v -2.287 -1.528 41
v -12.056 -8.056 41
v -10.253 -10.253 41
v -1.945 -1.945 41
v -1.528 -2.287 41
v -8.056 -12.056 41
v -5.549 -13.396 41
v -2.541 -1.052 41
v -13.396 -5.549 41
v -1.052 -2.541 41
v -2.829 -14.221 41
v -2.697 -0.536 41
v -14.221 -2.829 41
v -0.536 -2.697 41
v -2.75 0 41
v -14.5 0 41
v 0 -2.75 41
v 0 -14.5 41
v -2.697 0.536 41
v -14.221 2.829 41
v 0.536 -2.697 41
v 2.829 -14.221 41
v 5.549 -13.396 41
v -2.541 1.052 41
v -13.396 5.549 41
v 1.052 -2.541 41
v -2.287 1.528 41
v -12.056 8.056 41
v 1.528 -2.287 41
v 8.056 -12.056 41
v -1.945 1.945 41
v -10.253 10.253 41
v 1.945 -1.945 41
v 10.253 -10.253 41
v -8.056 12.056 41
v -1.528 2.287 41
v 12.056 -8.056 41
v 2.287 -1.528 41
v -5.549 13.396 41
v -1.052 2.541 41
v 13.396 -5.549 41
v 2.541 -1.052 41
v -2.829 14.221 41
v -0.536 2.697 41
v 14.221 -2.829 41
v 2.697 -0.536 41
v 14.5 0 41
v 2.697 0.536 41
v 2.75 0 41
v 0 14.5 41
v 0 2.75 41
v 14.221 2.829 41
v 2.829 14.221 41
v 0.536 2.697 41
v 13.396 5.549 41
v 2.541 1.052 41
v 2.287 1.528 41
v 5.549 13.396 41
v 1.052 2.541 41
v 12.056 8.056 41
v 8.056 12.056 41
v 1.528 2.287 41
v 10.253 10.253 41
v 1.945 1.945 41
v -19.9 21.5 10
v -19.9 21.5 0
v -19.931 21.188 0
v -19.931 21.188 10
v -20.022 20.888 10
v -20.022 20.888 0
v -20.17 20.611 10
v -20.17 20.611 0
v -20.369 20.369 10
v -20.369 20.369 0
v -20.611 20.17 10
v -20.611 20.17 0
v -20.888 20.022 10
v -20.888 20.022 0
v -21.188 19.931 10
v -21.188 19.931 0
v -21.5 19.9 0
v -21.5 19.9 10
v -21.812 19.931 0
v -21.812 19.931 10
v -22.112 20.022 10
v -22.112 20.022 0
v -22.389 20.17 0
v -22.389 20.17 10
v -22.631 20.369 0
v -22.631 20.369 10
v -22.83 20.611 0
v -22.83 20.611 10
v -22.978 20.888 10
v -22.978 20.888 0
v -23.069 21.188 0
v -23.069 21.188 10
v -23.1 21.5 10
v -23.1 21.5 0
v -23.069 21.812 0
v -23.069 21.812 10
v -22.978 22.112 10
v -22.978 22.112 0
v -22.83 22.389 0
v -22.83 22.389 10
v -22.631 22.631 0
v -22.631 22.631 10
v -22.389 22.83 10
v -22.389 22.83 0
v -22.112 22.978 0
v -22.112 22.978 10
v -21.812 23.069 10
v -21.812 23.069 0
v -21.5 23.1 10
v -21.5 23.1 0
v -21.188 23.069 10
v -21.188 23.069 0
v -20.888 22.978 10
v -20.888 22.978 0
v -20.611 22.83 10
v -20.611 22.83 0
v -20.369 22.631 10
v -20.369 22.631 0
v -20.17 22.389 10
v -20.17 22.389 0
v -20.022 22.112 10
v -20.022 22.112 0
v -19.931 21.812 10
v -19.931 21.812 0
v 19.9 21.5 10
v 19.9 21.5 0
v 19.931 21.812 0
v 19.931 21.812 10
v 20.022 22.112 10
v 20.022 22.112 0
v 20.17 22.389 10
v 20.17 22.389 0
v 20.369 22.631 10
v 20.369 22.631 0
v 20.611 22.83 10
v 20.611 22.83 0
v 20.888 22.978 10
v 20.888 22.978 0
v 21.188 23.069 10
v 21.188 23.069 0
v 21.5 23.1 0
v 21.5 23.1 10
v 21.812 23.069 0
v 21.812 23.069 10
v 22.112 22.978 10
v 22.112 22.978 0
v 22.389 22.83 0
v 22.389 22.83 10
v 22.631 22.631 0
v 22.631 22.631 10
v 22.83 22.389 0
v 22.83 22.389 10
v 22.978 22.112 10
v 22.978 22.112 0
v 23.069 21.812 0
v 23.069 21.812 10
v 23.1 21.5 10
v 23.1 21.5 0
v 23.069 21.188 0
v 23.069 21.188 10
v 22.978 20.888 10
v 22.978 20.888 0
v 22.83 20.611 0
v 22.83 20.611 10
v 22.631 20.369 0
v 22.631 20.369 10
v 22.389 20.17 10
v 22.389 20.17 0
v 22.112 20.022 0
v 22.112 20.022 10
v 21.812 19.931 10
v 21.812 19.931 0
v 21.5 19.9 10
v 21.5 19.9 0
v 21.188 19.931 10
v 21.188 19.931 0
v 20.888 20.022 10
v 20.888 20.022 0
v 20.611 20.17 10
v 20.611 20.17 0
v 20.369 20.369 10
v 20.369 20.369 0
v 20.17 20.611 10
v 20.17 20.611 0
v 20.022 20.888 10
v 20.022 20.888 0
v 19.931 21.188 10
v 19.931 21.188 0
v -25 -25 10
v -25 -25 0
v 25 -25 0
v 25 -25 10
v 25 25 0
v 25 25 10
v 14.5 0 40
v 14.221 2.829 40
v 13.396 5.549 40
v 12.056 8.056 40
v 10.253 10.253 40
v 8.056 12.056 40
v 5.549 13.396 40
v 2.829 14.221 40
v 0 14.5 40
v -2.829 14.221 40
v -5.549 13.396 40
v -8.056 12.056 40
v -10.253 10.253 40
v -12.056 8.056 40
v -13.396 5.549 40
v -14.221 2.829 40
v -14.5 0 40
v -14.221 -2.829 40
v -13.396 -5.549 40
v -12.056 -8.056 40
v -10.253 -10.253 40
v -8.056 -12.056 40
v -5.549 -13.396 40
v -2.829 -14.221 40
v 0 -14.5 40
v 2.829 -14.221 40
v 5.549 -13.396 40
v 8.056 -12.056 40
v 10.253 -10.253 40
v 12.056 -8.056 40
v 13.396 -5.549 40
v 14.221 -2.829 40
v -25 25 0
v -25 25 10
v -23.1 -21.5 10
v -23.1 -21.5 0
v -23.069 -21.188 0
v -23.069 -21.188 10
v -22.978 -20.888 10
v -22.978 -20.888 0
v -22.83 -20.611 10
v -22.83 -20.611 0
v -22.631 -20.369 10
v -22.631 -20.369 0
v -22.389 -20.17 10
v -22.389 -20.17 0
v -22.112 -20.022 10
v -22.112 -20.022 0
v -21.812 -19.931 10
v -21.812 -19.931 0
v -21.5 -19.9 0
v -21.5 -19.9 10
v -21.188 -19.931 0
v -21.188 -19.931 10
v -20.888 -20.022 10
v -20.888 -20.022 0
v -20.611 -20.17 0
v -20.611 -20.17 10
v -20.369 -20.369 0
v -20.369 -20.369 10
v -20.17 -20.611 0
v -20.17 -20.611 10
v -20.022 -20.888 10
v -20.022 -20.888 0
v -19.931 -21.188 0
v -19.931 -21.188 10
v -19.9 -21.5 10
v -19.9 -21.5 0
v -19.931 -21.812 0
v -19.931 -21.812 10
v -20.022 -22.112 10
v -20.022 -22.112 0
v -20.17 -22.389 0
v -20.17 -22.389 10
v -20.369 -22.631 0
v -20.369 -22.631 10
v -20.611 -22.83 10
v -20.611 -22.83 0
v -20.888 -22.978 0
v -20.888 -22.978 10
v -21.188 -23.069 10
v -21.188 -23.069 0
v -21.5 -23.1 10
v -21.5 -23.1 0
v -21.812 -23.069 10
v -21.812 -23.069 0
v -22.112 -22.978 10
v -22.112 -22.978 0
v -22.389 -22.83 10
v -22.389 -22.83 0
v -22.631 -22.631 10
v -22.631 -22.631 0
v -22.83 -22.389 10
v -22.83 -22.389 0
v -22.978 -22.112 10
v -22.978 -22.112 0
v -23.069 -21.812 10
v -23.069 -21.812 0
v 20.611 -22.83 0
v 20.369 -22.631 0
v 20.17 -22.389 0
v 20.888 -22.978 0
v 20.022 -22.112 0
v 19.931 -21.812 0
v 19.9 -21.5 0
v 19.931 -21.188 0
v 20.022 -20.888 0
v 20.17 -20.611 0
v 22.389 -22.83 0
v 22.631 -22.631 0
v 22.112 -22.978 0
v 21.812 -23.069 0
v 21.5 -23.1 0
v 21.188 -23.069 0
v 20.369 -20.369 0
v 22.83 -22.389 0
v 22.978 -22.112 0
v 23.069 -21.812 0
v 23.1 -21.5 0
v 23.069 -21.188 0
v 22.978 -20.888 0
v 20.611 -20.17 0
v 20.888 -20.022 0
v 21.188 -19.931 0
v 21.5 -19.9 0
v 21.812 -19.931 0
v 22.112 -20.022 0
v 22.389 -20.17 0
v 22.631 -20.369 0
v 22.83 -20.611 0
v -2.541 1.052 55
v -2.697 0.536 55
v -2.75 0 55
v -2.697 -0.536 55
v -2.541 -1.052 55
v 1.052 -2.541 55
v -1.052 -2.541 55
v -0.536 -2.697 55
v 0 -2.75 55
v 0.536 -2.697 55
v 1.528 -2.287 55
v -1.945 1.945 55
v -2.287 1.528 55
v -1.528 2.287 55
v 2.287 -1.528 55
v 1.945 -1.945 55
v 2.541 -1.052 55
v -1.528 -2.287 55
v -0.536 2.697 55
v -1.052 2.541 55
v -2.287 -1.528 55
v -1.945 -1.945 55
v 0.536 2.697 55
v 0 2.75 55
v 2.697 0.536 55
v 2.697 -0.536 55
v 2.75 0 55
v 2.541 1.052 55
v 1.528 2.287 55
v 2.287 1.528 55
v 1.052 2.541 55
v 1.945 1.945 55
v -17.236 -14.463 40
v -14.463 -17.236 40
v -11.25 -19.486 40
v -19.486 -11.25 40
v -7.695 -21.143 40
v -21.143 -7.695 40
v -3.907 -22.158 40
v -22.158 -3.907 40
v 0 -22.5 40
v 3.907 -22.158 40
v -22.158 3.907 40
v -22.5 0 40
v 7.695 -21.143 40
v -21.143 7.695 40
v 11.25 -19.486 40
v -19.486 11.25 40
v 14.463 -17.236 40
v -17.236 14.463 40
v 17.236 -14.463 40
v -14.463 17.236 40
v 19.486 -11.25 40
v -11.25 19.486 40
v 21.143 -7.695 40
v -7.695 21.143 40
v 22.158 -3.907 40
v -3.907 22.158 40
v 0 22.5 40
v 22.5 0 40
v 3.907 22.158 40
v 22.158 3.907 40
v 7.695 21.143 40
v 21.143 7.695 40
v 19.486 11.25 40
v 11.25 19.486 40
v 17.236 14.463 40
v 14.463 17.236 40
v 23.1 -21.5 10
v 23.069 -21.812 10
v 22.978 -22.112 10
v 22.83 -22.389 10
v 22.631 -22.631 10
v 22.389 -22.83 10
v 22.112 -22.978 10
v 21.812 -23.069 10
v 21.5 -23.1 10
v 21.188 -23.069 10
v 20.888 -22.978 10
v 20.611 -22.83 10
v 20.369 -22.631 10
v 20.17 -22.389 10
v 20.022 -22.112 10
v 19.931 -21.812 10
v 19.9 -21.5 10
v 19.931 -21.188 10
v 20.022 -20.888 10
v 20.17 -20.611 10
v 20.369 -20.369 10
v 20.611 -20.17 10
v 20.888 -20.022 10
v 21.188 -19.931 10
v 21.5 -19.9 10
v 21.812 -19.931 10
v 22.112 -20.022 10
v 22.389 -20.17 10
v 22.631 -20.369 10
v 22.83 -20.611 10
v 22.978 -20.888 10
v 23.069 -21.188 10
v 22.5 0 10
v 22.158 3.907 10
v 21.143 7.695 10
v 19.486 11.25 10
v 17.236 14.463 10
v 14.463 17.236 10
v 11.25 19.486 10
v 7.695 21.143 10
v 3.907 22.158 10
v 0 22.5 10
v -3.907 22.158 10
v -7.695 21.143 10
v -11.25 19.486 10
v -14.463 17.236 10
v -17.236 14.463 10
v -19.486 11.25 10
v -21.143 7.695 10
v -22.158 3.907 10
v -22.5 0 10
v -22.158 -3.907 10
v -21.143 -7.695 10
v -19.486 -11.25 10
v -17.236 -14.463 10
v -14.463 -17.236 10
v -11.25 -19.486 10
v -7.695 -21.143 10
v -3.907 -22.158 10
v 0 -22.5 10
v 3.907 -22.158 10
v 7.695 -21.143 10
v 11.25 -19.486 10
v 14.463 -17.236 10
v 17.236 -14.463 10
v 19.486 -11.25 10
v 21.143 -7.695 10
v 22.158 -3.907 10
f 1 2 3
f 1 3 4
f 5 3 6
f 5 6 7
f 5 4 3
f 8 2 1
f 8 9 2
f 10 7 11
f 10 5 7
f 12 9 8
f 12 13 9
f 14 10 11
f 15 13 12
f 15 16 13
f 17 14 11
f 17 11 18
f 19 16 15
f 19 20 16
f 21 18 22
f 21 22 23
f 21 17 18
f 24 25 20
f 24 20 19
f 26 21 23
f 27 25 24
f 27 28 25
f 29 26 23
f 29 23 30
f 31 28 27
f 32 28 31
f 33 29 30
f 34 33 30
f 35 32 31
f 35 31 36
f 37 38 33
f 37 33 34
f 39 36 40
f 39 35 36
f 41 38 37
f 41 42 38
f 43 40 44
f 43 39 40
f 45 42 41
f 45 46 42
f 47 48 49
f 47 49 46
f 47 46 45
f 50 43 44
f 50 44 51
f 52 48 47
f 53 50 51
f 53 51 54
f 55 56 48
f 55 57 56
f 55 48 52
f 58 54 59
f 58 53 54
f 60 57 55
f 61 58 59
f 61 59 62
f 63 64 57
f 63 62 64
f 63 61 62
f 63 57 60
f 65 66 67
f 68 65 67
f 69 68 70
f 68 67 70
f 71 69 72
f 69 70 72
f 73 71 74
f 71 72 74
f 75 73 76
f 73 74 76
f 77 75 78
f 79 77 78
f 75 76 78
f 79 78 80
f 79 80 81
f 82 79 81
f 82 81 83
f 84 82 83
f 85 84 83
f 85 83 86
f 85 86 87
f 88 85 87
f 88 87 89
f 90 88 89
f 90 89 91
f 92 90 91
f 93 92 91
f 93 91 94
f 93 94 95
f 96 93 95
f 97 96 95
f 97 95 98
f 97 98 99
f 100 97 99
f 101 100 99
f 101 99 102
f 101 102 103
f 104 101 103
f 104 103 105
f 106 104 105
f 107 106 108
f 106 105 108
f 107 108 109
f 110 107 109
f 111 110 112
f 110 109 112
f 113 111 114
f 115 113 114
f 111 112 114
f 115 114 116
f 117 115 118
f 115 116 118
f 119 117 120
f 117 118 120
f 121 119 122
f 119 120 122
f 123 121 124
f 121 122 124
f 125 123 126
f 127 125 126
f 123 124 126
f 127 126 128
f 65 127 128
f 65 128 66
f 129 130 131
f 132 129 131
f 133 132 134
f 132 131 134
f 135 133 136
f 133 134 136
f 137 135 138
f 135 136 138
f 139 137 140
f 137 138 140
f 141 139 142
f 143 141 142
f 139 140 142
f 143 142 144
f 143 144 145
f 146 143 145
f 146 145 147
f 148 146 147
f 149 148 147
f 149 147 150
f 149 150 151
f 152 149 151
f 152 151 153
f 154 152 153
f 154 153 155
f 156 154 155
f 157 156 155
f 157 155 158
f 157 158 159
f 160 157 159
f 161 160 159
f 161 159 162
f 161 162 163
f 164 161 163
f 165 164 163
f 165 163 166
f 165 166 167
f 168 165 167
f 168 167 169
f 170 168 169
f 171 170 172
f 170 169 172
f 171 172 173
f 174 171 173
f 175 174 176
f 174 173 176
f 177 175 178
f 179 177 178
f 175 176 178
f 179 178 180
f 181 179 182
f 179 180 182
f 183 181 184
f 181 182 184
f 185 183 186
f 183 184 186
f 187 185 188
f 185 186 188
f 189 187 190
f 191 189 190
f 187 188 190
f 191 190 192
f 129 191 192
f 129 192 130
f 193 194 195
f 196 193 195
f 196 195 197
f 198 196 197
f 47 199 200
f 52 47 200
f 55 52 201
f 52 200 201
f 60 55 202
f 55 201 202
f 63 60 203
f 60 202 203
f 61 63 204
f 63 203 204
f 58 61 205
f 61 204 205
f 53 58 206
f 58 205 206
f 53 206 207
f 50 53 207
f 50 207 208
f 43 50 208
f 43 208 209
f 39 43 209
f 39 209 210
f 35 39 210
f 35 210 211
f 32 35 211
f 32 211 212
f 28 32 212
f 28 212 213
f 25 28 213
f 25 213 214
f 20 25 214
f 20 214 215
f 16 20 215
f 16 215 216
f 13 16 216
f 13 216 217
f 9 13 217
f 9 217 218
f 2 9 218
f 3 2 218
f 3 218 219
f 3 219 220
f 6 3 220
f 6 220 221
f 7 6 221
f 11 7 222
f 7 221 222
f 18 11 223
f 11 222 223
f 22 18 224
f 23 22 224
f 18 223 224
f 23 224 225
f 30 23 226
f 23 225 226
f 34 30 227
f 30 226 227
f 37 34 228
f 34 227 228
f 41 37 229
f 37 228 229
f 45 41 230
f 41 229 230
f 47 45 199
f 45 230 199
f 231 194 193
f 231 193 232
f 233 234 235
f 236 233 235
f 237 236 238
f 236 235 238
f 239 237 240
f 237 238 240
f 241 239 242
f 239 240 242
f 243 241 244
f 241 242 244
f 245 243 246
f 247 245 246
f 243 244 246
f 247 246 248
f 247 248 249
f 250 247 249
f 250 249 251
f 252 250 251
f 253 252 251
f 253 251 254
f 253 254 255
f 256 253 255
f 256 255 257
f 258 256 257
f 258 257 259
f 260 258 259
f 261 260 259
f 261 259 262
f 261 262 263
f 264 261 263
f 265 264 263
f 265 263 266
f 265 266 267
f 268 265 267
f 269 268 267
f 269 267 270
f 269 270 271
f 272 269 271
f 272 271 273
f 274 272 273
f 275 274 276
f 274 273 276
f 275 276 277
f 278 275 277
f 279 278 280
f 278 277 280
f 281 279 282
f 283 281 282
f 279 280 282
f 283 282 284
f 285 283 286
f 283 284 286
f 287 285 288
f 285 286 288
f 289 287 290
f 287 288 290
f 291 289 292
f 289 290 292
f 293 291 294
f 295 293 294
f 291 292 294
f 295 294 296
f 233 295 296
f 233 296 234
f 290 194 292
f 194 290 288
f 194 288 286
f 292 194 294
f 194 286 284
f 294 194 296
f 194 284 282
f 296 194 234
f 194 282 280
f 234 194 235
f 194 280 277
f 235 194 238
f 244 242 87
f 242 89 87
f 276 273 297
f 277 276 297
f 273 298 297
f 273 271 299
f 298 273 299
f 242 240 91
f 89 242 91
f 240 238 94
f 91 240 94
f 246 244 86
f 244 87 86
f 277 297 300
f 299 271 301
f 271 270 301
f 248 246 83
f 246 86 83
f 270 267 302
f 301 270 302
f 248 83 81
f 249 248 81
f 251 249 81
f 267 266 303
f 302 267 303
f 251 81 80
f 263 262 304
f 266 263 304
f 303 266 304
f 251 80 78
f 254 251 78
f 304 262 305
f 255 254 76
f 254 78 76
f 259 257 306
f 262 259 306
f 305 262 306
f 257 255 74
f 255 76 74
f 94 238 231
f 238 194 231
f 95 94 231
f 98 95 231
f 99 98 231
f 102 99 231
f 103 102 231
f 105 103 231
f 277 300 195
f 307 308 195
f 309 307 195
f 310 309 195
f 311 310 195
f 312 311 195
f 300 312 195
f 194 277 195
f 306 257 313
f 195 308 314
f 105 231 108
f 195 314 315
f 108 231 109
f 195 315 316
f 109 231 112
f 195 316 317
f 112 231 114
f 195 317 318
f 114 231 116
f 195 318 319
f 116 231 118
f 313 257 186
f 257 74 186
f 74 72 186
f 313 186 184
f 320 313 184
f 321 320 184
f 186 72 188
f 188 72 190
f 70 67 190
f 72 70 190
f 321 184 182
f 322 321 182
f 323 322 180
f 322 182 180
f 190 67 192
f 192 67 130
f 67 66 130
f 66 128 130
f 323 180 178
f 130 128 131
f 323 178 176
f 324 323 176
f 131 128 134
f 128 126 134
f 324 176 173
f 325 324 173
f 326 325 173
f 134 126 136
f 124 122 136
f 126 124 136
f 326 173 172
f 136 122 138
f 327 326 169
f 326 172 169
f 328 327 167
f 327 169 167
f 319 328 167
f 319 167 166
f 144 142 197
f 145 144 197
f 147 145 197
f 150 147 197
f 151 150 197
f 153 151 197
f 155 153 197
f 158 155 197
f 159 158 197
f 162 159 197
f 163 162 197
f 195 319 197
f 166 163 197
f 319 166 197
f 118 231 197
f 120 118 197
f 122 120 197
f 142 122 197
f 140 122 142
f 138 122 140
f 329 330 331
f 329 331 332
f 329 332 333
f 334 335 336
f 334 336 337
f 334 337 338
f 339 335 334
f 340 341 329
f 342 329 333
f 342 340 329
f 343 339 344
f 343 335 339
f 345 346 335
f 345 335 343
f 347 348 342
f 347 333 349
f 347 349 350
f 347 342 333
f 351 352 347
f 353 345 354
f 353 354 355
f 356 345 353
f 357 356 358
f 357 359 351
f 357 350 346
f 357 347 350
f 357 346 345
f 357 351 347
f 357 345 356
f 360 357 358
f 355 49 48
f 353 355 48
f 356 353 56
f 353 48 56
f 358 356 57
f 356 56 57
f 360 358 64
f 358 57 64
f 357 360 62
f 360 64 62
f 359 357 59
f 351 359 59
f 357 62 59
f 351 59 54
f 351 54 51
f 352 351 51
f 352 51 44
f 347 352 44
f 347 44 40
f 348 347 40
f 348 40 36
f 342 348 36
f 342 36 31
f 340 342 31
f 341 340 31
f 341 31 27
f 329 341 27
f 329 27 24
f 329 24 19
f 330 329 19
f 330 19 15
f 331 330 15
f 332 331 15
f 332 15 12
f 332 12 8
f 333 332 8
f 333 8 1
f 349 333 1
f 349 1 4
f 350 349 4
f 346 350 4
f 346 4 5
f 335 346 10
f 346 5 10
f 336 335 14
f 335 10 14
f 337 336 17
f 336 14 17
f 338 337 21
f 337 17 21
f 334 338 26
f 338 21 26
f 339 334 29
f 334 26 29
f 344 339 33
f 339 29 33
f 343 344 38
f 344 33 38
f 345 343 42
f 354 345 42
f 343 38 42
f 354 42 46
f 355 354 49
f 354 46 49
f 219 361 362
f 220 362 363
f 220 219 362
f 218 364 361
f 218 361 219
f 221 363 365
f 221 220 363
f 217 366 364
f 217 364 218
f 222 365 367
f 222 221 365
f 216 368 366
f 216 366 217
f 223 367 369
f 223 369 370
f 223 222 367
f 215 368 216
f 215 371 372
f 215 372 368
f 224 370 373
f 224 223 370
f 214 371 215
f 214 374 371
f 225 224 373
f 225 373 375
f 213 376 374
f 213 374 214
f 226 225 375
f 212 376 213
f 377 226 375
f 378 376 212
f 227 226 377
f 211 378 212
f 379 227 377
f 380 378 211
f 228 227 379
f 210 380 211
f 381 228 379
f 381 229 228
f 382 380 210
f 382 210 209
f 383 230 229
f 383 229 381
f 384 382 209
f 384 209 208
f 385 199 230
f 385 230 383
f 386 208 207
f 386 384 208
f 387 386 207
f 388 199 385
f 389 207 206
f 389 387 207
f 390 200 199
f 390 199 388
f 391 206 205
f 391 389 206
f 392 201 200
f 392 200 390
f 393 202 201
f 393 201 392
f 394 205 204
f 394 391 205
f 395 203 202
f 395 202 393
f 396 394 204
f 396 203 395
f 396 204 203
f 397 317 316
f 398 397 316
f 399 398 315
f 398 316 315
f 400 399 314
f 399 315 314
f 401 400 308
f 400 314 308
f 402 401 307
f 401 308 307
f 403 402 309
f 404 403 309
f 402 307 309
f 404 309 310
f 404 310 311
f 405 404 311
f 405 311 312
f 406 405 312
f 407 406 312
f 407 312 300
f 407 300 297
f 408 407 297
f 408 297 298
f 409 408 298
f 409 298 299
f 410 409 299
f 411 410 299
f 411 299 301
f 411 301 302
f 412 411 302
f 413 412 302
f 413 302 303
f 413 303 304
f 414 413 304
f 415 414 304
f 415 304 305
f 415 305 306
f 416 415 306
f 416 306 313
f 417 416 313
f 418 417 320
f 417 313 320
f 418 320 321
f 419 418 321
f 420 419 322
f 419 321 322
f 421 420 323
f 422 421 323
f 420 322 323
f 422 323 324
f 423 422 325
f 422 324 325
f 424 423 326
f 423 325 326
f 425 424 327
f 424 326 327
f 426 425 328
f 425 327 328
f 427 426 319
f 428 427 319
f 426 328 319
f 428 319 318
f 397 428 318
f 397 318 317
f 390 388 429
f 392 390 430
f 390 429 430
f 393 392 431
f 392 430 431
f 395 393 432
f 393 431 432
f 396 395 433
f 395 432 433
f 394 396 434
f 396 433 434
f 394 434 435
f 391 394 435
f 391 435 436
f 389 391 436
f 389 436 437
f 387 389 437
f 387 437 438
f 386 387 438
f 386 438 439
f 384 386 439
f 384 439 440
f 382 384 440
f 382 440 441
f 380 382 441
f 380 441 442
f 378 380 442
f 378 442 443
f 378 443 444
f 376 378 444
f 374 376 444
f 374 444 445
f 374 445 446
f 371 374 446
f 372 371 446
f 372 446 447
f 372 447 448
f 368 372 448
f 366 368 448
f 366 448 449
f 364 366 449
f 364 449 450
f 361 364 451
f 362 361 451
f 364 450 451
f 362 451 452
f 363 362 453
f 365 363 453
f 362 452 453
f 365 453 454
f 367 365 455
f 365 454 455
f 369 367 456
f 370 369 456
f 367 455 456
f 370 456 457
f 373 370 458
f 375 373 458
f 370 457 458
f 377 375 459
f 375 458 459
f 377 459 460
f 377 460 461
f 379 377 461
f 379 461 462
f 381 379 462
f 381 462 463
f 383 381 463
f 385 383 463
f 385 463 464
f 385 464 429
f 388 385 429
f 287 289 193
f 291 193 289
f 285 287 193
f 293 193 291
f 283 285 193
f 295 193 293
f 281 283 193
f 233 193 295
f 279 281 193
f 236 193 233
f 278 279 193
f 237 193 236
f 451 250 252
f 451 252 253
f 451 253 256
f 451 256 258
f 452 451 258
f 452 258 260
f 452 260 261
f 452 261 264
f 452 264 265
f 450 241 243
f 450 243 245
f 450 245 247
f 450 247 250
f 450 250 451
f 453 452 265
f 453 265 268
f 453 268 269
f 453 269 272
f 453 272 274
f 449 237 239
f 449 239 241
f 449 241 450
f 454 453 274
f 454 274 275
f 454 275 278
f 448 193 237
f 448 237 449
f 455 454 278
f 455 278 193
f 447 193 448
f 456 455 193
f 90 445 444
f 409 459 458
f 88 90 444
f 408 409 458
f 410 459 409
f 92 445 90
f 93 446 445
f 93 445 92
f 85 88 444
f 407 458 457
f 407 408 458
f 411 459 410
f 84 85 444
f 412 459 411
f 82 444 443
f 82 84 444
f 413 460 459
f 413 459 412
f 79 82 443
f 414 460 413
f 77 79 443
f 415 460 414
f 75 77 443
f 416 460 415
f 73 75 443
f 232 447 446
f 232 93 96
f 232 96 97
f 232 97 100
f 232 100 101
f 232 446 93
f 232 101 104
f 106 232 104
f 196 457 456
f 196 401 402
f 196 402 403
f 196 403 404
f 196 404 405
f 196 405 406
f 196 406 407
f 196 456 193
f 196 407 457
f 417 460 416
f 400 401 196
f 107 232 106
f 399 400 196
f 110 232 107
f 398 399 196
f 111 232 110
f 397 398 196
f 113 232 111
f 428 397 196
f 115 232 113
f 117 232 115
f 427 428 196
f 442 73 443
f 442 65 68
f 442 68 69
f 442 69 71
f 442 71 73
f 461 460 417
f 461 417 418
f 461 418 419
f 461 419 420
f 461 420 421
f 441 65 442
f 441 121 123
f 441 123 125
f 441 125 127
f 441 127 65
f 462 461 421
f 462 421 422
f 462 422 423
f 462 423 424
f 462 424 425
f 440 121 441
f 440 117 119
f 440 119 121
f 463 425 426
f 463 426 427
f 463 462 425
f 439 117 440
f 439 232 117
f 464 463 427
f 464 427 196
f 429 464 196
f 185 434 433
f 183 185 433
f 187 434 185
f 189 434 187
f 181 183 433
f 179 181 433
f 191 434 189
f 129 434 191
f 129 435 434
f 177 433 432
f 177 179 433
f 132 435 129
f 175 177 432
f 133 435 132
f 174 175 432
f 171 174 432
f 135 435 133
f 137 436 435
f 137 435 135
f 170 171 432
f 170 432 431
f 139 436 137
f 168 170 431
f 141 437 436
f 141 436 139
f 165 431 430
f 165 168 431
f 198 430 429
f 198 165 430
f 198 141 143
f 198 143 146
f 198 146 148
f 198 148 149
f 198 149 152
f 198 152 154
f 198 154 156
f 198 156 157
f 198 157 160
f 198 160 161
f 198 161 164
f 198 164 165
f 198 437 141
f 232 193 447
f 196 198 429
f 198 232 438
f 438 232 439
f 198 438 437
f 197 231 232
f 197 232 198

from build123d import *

# Parameters (mm, degrees)
SKETCH2_W           = 50
SKETCH2_H           = 50
BOSS_EXTRUDE1_DEPTH = 10
SKETCH2_3_R         = 22.5
BOSS_EXTRUDE2_DEPTH = 40
SKETCH2_4_R         = 14.5
SKETCH2_4_R_2       = 2.75
BOSS_EXTRUDE3_DEPTH = 41
SKETCH2_5_R         = 2.75
BOSS_EXTRUDE4_DEPTH = 55
SKETCH4_R           = 1.6
CUT_EXTRUDE1_DEPTH  = 66.383484153


with BuildPart() as part:
    # Sketch2 → Boss-Extrude1 (new body)
    with BuildSketch(Plane.XY):
        Rectangle(SKETCH2_W, SKETCH2_H)
    extrude(amount=BOSS_EXTRUDE1_DEPTH)

    # Sketch2<3> → Boss-Extrude2 (add)
    with BuildSketch(Plane.XY):
        Circle(SKETCH2_3_R)
    extrude(amount=BOSS_EXTRUDE2_DEPTH)

    # Sketch2<4> → Boss-Extrude3 (add)
    with BuildSketch(Plane.XY):
        Circle(SKETCH2_4_R)
        Circle(SKETCH2_4_R_2, mode=Mode.SUBTRACT)
    extrude(amount=BOSS_EXTRUDE3_DEPTH)

    # Sketch2<5> → Boss-Extrude4 (add)
    with BuildSketch(Plane.XY):
        Circle(SKETCH2_5_R)
    extrude(amount=BOSS_EXTRUDE4_DEPTH)

    # Sketch4 → Cut-Extrude1 (cut, through all)
    with BuildSketch(Plane(origin=(0, 0, 0), x_dir=(-1, 0, 0), z_dir=(0, 0, -1))):
        with Locations((-21.5, 21.5)):
            Circle(SKETCH4_R)
        with Locations((-21.5, -21.5)):
            Circle(SKETCH4_R)
        with Locations((21.5, -21.5)):
            Circle(SKETCH4_R)
        with Locations((21.5, 21.5)):
            Circle(SKETCH4_R)
    extrude(amount=-CUT_EXTRUDE1_DEPTH, mode=Mode.SUBTRACT)


solid = part.part
